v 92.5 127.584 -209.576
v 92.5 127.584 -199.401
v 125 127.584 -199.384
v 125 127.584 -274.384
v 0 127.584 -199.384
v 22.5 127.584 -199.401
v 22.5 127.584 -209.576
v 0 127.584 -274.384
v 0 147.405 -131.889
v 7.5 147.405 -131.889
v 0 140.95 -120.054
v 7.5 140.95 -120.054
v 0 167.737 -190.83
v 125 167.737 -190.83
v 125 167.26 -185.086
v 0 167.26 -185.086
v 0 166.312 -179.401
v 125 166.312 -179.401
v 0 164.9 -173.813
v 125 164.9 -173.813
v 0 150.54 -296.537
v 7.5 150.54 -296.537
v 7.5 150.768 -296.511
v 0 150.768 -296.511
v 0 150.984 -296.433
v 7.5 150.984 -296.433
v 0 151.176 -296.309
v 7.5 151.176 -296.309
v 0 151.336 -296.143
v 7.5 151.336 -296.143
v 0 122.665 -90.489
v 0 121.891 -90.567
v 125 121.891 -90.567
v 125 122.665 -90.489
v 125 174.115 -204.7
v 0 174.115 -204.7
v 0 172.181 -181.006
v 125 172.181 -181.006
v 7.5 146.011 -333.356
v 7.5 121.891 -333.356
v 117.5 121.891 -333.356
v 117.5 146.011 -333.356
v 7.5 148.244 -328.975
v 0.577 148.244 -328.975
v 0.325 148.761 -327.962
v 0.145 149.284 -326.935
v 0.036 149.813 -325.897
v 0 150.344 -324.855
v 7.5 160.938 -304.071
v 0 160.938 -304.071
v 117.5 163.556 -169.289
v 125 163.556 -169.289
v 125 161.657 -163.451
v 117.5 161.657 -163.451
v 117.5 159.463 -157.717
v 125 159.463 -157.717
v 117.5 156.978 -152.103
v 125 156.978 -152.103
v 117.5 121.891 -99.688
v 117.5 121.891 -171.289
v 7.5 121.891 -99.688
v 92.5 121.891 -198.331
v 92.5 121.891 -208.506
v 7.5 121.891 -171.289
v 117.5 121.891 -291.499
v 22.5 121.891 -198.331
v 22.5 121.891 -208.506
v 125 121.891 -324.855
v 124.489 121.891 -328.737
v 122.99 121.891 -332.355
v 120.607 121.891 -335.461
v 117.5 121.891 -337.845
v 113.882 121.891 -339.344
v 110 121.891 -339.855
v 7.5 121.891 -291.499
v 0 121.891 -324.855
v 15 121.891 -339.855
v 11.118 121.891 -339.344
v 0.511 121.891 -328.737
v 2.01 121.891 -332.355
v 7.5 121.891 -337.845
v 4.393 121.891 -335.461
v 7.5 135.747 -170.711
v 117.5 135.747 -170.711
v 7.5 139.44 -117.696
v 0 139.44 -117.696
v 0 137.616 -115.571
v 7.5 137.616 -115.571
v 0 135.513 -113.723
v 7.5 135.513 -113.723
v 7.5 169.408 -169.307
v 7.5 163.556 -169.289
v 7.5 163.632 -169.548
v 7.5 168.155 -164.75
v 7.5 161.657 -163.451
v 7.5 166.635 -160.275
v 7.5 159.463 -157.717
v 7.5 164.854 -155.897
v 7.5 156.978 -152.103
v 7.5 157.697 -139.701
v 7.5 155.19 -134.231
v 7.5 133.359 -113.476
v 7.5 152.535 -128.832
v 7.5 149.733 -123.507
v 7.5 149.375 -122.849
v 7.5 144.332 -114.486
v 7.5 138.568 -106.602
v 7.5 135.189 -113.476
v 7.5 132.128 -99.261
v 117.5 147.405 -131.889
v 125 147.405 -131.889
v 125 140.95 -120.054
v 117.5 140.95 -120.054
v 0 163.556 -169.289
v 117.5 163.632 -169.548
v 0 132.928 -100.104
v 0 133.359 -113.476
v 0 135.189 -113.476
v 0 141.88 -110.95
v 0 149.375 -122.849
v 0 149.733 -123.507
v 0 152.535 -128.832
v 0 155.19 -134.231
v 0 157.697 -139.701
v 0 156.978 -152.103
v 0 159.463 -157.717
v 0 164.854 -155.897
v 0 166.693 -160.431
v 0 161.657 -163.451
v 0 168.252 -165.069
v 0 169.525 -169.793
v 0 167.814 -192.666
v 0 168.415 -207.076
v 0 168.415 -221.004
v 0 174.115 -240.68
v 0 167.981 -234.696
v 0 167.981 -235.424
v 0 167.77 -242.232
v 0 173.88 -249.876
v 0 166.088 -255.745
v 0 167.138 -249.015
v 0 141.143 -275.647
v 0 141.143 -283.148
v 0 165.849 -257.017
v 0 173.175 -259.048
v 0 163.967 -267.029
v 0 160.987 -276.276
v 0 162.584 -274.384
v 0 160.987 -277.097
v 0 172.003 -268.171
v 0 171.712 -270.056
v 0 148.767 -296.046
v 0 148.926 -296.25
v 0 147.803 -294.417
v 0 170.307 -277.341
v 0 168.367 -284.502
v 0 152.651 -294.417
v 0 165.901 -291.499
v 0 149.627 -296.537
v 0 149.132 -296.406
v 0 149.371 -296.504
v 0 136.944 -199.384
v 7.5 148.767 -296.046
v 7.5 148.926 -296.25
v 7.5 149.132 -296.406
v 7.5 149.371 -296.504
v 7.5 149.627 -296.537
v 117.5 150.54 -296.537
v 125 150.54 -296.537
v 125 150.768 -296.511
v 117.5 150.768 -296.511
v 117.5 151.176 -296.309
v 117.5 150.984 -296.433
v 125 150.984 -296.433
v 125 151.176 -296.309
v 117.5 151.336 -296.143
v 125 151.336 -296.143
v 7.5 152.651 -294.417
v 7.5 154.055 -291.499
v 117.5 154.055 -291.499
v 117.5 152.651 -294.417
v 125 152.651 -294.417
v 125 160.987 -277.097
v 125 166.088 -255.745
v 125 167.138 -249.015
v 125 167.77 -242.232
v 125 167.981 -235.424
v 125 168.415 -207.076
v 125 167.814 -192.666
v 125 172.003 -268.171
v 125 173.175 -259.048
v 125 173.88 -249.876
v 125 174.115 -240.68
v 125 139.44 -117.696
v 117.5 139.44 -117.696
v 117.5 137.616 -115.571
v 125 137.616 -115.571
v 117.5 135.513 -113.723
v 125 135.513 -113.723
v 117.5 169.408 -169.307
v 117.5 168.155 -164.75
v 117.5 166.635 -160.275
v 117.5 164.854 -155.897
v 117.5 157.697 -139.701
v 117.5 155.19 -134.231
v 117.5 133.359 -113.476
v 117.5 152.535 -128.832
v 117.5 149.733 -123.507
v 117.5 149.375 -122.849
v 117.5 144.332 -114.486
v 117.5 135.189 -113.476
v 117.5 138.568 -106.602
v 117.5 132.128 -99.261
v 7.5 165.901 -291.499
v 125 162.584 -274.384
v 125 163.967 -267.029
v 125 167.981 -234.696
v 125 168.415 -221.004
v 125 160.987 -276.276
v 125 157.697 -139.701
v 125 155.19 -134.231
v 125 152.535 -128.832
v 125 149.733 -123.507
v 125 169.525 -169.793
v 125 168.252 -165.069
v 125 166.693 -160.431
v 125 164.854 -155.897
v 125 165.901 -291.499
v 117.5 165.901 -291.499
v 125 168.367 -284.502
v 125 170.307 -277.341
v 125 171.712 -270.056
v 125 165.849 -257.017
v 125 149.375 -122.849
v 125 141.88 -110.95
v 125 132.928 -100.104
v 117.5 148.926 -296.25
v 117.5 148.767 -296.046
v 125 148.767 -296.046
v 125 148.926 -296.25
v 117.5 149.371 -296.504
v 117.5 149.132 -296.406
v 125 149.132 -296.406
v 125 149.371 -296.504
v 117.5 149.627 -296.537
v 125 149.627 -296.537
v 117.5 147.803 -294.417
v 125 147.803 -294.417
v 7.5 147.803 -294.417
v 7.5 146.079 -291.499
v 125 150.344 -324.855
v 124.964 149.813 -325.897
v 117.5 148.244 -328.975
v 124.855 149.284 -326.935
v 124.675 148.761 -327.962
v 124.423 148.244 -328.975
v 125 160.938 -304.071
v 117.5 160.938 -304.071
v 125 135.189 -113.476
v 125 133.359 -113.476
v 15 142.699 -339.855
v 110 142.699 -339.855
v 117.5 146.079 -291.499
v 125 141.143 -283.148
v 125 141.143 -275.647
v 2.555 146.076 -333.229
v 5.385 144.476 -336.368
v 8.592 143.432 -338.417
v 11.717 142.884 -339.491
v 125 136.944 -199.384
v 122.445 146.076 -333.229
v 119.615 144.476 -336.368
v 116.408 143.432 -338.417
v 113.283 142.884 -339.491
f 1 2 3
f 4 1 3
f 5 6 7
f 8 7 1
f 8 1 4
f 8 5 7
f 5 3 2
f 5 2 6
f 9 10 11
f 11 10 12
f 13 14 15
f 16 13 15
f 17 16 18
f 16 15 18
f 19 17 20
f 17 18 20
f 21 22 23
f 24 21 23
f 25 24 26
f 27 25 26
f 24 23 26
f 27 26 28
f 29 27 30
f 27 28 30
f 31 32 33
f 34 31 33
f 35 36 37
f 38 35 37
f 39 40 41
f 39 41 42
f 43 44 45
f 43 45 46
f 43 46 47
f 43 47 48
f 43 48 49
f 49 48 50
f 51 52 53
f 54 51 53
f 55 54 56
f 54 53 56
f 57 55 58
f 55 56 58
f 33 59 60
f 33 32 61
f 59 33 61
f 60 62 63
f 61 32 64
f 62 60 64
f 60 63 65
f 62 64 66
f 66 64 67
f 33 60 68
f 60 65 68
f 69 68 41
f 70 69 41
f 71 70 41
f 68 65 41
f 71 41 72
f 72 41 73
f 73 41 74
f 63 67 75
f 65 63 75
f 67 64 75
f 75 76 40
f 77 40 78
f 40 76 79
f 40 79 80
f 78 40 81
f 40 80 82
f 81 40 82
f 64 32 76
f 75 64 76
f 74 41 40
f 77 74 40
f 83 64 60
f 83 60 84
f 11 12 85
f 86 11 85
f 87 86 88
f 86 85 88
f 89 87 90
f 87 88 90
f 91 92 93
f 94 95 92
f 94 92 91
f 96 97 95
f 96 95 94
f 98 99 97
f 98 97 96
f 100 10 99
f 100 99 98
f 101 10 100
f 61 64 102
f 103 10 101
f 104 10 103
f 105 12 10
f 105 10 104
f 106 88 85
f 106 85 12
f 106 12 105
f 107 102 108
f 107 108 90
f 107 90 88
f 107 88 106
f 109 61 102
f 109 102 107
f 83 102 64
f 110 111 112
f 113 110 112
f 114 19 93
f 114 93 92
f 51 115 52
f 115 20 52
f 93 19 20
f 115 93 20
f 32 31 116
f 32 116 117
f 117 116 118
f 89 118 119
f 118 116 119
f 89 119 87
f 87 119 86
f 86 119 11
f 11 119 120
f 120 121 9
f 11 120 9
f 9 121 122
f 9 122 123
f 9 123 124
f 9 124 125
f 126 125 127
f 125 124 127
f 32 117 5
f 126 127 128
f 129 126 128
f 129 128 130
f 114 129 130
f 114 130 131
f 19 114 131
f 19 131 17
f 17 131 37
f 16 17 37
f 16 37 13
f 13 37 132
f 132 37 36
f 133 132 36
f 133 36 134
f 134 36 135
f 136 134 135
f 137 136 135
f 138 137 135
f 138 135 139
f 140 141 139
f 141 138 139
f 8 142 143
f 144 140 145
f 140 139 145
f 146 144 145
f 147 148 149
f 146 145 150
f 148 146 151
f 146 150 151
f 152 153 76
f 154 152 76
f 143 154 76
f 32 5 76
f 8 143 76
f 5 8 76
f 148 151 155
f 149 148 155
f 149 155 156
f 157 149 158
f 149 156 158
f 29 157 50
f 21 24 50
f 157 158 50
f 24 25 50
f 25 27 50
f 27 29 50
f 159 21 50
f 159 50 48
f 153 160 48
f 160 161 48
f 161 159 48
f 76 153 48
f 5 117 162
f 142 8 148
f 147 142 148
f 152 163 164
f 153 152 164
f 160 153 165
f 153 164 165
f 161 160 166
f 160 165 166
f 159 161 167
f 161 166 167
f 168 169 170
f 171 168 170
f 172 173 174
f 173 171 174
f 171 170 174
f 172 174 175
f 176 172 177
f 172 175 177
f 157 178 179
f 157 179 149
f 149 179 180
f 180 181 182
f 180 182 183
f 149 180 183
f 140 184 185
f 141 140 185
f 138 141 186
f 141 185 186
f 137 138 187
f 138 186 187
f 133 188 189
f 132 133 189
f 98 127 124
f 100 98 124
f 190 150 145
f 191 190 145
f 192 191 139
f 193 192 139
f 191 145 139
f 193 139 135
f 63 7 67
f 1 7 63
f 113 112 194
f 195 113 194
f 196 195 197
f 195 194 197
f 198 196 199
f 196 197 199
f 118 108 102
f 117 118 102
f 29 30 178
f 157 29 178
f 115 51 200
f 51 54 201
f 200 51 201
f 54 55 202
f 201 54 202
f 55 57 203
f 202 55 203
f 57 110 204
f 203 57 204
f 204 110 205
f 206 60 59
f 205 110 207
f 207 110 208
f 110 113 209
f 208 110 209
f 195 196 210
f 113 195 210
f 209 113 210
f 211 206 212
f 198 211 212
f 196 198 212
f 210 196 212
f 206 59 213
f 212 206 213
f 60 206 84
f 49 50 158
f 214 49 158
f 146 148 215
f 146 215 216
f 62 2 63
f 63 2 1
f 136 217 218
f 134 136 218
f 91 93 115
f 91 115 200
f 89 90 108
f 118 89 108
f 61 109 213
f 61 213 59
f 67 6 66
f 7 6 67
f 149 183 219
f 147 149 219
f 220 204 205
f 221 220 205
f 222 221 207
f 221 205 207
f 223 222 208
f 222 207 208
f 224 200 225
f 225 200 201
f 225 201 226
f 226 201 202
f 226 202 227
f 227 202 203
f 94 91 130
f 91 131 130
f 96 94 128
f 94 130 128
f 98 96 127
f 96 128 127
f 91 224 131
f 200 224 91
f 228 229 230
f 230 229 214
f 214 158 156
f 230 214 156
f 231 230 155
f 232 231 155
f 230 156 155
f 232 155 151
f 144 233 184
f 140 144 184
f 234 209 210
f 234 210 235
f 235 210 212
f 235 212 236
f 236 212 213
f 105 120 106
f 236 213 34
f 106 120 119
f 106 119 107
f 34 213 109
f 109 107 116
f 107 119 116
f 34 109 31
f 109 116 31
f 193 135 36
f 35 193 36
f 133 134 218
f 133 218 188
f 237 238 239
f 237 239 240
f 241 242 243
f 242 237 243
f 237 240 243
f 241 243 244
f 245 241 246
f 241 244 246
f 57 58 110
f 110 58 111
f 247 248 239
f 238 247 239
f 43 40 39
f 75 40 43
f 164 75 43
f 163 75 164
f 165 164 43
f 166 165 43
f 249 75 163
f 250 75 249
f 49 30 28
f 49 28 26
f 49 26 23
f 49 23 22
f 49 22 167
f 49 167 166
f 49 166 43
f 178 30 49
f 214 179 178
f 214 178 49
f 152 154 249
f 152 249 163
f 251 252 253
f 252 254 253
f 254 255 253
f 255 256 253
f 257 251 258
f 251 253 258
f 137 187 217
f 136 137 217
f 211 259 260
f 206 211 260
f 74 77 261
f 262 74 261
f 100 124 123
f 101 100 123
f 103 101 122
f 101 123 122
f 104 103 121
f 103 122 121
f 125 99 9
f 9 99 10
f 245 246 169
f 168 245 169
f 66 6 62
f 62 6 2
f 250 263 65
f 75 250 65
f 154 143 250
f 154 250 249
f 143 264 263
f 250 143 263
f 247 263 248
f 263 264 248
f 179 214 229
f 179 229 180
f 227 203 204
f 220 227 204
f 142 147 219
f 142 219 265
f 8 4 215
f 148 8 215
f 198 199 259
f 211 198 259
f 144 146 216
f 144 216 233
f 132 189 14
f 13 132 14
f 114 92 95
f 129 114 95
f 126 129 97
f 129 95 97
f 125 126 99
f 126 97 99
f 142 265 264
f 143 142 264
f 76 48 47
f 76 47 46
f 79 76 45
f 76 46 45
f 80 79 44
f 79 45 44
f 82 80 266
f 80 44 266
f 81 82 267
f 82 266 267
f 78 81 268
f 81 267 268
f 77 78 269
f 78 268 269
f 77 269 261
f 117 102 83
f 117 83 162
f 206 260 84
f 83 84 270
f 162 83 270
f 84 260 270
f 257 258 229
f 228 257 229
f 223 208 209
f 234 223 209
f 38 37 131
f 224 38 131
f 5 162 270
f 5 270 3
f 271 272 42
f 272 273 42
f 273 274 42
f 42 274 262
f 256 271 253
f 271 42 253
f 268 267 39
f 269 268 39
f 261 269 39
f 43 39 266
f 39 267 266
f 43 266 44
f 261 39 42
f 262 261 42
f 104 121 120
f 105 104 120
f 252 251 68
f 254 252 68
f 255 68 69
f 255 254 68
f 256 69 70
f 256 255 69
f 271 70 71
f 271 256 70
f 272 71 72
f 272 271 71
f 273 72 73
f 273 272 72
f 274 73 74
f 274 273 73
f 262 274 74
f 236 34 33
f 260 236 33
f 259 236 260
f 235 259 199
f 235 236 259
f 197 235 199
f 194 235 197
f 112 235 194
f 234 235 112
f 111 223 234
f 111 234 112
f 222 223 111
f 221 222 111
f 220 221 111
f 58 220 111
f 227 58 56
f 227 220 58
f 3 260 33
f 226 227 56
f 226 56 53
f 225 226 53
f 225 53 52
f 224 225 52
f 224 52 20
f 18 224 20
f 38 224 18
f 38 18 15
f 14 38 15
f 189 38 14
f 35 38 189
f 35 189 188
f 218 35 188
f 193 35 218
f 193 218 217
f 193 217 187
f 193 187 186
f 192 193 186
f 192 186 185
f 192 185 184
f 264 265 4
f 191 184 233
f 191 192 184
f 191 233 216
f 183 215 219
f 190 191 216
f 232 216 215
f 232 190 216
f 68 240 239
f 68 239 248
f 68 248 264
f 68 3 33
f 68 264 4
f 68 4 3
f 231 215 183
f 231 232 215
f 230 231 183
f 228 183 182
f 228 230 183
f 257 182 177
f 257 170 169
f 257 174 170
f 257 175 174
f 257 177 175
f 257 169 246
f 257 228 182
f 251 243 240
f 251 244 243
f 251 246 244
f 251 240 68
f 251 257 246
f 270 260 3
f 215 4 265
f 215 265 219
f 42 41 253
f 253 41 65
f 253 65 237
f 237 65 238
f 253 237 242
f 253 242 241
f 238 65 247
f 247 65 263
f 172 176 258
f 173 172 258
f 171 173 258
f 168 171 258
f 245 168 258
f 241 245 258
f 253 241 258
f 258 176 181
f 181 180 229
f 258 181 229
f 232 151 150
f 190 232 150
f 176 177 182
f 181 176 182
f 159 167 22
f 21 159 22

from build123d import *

# Parameters (mm, degrees)
BOSS_EXTRUDE1_DEPTH = 125
CUT_EXTRUDE1_DEPTH  = 402.798830122
CUT_EXTRUDE2_START  = 7.5
CUT_EXTRUDE2_DEPTH  = 110
CUT_EXTRUDE3_START  = 7.5
CUT_EXTRUDE3_DEPTH  = 110
CUT_EXTRUDE4_REACH  = 265.278
SKETCH6_W           = 70.076051312
SKETCH6_H           = 19.92290321
CUT_EXTRUDE5_REACH  = 297.109
SKETCH5_W           = 70
SKETCH5_H           = 20.313376992
CUT_EXTRUDE6_REACH  = 337.806
SKETCH7_W           = 70
SKETCH7_H           = 10
FILLET1_R           = 15
CUT_EXTRUDE7_START  = -125
CUT_EXTRUDE7_DEPTH  = 125
CHAMFER1_START      = 101
CHAMFER1_OUTLINE_W  = 127
CHAMFER1_OUTLINE_H  = 4
CHAMFER1_DEPTH      = 1.291551205


with BuildPart() as part:
    # Sketch1 → Boss-Extrude1 (new body)
    with BuildSketch(Plane(origin=(0, 0, 0), x_dir=(0, 0, -1), z_dir=(1, 0, 0))):
        with BuildLine():
            Line((89.8548345, 121.890508387), (339.8548345, 121.890508387))
            Line((339.8548345, 121.890508387), (339.8548345, 142.698803067))
            Line((339.8548345, 142.698803067), (328.974757131, 148.244473571))
            Line((328.974757131, 148.244473571), (304.07146893, 160.937897169))
            Line((304.07146893, 160.937897169), (291.499350701, 165.900575417))
            ThreePointArc((291.499350701, 165.900575417), (280.939522904, 169.403551358), (270.055923817, 171.711813574))
            Line((270.055923817, 171.711813574), (268.171463935, 172.003048284))
            ThreePointArc((268.171463935, 172.003048284), (254.466056361, 173.586145336), (240.679656072, 174.114879761))
            Line((240.679656072, 174.114879761), (232.021178794, 174.114879761))
            Line((232.021178794, 174.114879761), (204.700095622, 174.114879761))
            Line((204.700095622, 174.114879761), (181.005704906, 172.180643784))
            Line((181.005704906, 172.180643784), (169.793278807, 169.525069181))
            ThreePointArc((169.793278807, 169.525069181), (162.738148163, 167.508293641), (155.897481651, 164.85357451))
            Line((155.897481651, 164.85357451), (139.701268702, 157.697108323))
            ThreePointArc((139.701268702, 157.697108323), (131.522677332, 153.88092637), (123.507487012, 149.732513946))
            Line((123.507487012, 149.732513946), (122.849499947, 149.374661332))
            ThreePointArc((122.849499947, 149.374661332), (105.217865801, 137.440006065), (90.215677989, 122.332230589))
            Line((90.215677989, 122.332230589), (89.8548345, 121.890508387))
        make_face()
    extrude(amount=BOSS_EXTRUDE1_DEPTH)

    # Sketch2 → Cut-Extrude1 (cut, through all)
    with BuildSketch(Plane(origin=(125, 0, 0), x_dir=(0, 0, -1), z_dir=(1, 0, 0))):
        with BuildLine():
            Line((113.475739659, 133.359325966), (201.174236889, 137.018348058))
            Line((201.174236889, 137.018348058), (207.075885424, 168.415118264))
            Line((207.075885424, 168.415118264), (192.666474105, 167.813918061))
            Line((192.666474105, 167.813918061), (190.829871081, 167.73728994))
            ThreePointArc((190.829871081, 167.73728994), (182.233808887, 166.844681368), (173.813252446, 164.899619793))
            Line((173.813252446, 164.899619793), (169.2892062, 163.555605085))
            ThreePointArc((169.2892062, 163.555605085), (160.569837528, 160.5967142), (152.103009161, 156.977979241))
            Line((152.103009161, 156.977979241), (131.888883088, 147.40524948))
            Line((131.888883088, 147.40524948), (120.054289503, 140.950016615))
            ThreePointArc((120.054289503, 140.950016615), (116.601738736, 138.565427019), (113.722697716, 135.512969462))
            Line((113.722697716, 135.512969462), (113.475739659, 135.188837012))
            Line((113.475739659, 135.188837012), (113.475739659, 133.359325966))
        make_face()
        with BuildLine():
            Line((221.003775967, 168.415118264), (218.761149524, 138.906875589))
            Line((218.761149524, 138.906875589), (272.584184163, 138.906875589))
            Line((272.584184163, 138.906875589), (274.383679522, 162.58444611))
            Line((274.383679522, 162.58444611), (267.028526617, 163.966993649))
            Line((267.028526617, 163.966993649), (257.016670223, 165.848921543))
            Line((257.016670223, 165.848921543), (255.744876296, 166.087980551))
            ThreePointArc((255.744876296, 166.087980551), (245.628472921, 167.506912168), (235.424062848, 167.981253005))
            Line((235.424062848, 167.981253005), (234.695600568, 167.981253005))
            Line((234.695600568, 167.981253005), (221.003775967, 168.415118264))
        make_face()
        with BuildLine():
            Line((276.275786009, 160.987395212), (275.646964577, 141.143186512))
            Line((275.646964577, 141.143186512), (283.14790924, 141.143186512))
            Line((283.14790924, 141.143186512), (294.416525801, 147.803376186))
            Line((294.416525801, 147.803376186), (296.046101937, 148.766518919))
            ThreePointArc((296.046101937, 148.766518919), (296.405855365, 149.13182216), (296.537289859, 149.627396535))
            Line((296.537289859, 149.627396535), (296.537289859, 150.540124257))
            ThreePointArc((296.537289859, 150.540124257), (296.433404588, 150.983946735), (296.143333074, 151.335555977))
            Line((296.143333074, 151.335555977), (294.416525801, 152.651218661))
            Line((294.416525801, 152.651218661), (277.097452917, 160.987395212))
            Line((277.097452917, 160.987395212), (276.275786009, 160.987395212))
        make_face()
    extrude(amount=-CUT_EXTRUDE1_DEPTH, mode=Mode.SUBTRACT)

    # Cut-Extrude2: read off the stored shape, not the designer's step
    # Cut-Extrude2 outline → Cut-Extrude2 (cut)
    with BuildSketch(Plane.YZ.offset(CUT_EXTRUDE2_START)):
        with BuildLine():
            Line((121.890508387, -99.688159251), (121.890508387, -171.289102204))
            Line((121.890508387, -171.289102204), (135.747336393, -170.710957294))
            Line((135.747336393, -170.710957294), (133.359325966, -113.475739659))
            Line((133.359325966, -113.475739659), (135.188837012, -113.475739659))
            Line((135.188837012, -113.475739659), (135.512969462, -113.722697716))
            ThreePointArc((135.512969462, -113.722697716), (138.565427019, -116.601738736), (140.950016615, -120.054289503))
            Line((140.950016615, -120.054289503), (147.40524948, -131.888883088))
            Line((147.40524948, -131.888883088), (156.977979241, -152.103009161))
            ThreePointArc((156.977979241, -152.103009161), (160.5967142, -160.569837528), (163.555605085, -169.2892062))
            Line((163.555605085, -169.2892062), (163.632345036, -169.547518172))
            Line((163.632345036, -169.547518172), (169.408178174, -169.306534555))
            ThreePointArc((169.408178174, -169.306534555), (167.428165725, -162.501028912), (164.85357451, -155.897481651))
            Line((164.85357451, -155.897481651), (157.697108323, -139.701268702))
            ThreePointArc((157.697108323, -139.701268702), (153.88092637, -131.522677332), (149.732513946, -123.507487012))
            Line((149.732513946, -123.507487012), (149.374661332, -122.849499947))
            ThreePointArc((149.374661332, -122.849499947), (141.537958861, -110.480020928), (132.127738515, -99.261033903))
            Line((132.127738515, -99.261033903), (121.890508387, -99.688159251))
        make_face()
    extrude(amount=CUT_EXTRUDE2_DEPTH, mode=Mode.SUBTRACT)

    # Cut-Extrude3: read off the stored shape, not the designer's step
    # Cut-Extrude3 outline → Cut-Extrude3 (cut)
    with BuildSketch(Plane.YZ.offset(CUT_EXTRUDE3_START)):
        with BuildLine():
            Line((121.890508387, -291.499350701), (121.890508387, -333.35633566))
            Line((121.890508387, -333.35633566), (146.011144709, -333.35633566))
            Line((146.011144709, -333.35633566), (160.937897169, -304.07146893))
            Line((160.937897169, -304.07146893), (165.900575417, -291.499350701))
            Line((165.900575417, -291.499350701), (154.055340396, -291.499350701))
            Line((154.055340396, -291.499350701), (152.651218661, -294.416525801))
            Line((152.651218661, -294.416525801), (151.335555977, -296.143333074))
            ThreePointArc((151.335555977, -296.143333074), (150.983946735, -296.433404588), (150.540124257, -296.537289859))
            Line((150.540124257, -296.537289859), (149.627396535, -296.537289859))
            ThreePointArc((149.627396535, -296.537289859), (149.13182216, -296.405855365), (148.766518919, -296.046101937))
            Line((148.766518919, -296.046101937), (146.079212499, -291.499350701))
            Line((146.079212499, -291.499350701), (121.890508387, -291.499350701))
        make_face()
    extrude(amount=CUT_EXTRUDE3_DEPTH, mode=Mode.SUBTRACT)

    # Cut-Extrude4: up to this plane
    cut_extrude4_end = Plane(origin=(0, 137.018348058, -201.174236889), z_dir=(0, -0.18473466771426061, -0.9827884322398701))
    # Sketch6 → Cut-Extrude4 (cut, up to the surface)
    with BuildSketch(Plane(origin=(0, -15.732649467, -207.008545619), x_dir=(-1, 0, 0), z_dir=(0, -0.07578145826840303, -0.9971244509000441)), mode=Mode.PRIVATE) as cut_extrude4_sk1:
        with Locations((-57.714978641, 162.925898332)):
            Rectangle(SKETCH6_W, SKETCH6_H)
    cut_extrude4_tool1 = split(extrude(cut_extrude4_sk1.sketch, amount=-CUT_EXTRUDE4_REACH, mode=Mode.PRIVATE), bisect_by=cut_extrude4_end, keep=Keep.BOTH, mode=Mode.PRIVATE)
    add(cut_extrude4_tool1.solids().sort_by_distance((57.714979, 146.724747, -219.355308))[0], mode=Mode.SUBTRACT)

    # Cut-Extrude5: up to this plane
    cut_extrude5_end = Plane(origin=(0, 168.415118264, -221.003775967), z_dir=(0, 0.075781458268403, 0.997124450900044))
    # Sketch5 → Cut-Extrude5 (cut, up to the surface)
    with BuildSketch(Plane(origin=(0, -31.848196468, -169.432405211), x_dir=(1, 0, 0), z_dir=(0, 0.18473466771426064, 0.9827884322398701)), mode=Mode.PRIVATE) as cut_extrude5_sk1:
        with Locations((57.5, 181.980591777)):
            Rectangle(SKETCH5_W, SKETCH5_H)
    cut_extrude5_tool1 = split(extrude(cut_extrude5_sk1.sketch, amount=-CUT_EXTRUDE5_REACH, mode=Mode.PRIVATE), bisect_by=cut_extrude5_end, keep=Keep.BOTH, mode=Mode.PRIVATE)
    add(cut_extrude5_tool1.solids().sort_by_distance((57.5, 147.000224, -203.050529))[0], mode=Mode.SUBTRACT)

    # Cut-Extrude6: up to this plane
    cut_extrude6_end = Plane(origin=(125, 121.890508387, -89.8548345), z_dir=(0, 1, 0))
    # Sketch7 → Cut-Extrude6 (cut, up to the surface)
    with BuildSketch(Plane(origin=(0, 168.866544526, -31.741831678), x_dir=(1, 0, 0), z_dir=(0, 0.9827884322398701, -0.18473466771426067)), mode=Mode.PRIVATE) as cut_extrude6_sk1:
        with Locations((57.5, 177.39967388)):
            Rectangle(SKETCH7_W, SKETCH7_H)
    cut_extrude6_tool1 = split(extrude(cut_extrude6_sk1.sketch, amount=-CUT_EXTRUDE6_REACH, mode=Mode.PRIVATE), bisect_by=cut_extrude6_end, keep=Keep.BOTH, mode=Mode.PRIVATE)
    add(cut_extrude6_tool1.solids().sort_by_distance((57.5, 136.094675, -206.088179))[0], mode=Mode.SUBTRACT)

    # Fillet1
    fillet1_edges = [part.edges().sort_by_distance(p)[0] for p in [
        (125, 132.294655727, -339.8548345),
        (0, 132.294655727, -339.8548345),
    ]]
    fillet(fillet1_edges, radius=FILLET1_R)

    # Sketch14 → Cut-Extrude7 (cut)
    with BuildSketch(Plane(origin=(125, 0, 0), x_dir=(0, 0, -1), z_dir=(1, 0, 0)).offset(CUT_EXTRUDE7_START)):
        Polygon((221.003775967, 168.415118264), (207.075885424, 168.415118264), (199.383679522, 168.094178314), (199.383679522, 127.58444611), (274.383679522, 127.58444611), (274.383679522, 162.58444611), (255.744876296, 166.087980551), (245.628472921, 167.506912168), (235.059831708, 167.981253005), (234.695600568, 167.981253005), align=None)
    extrude(amount=CUT_EXTRUDE7_DEPTH, mode=Mode.SUBTRACT)

    # Chamfer1: read off the stored shape, not the designer's step
    # Chamfer1 outline → Chamfer1 (cut)
    with BuildSketch(Plane(origin=(0, 0, 0), x_dir=(1, 0, 0), z_dir=(0, 0.09991010561593, -0.99499646773032)).offset(CHAMFER1_START)):
        with Locations((62.5, -113)):
            Rectangle(CHAMFER1_OUTLINE_W, CHAMFER1_OUTLINE_H)
    extrude(amount=CHAMFER1_DEPTH, mode=Mode.SUBTRACT)


solid = part.part
